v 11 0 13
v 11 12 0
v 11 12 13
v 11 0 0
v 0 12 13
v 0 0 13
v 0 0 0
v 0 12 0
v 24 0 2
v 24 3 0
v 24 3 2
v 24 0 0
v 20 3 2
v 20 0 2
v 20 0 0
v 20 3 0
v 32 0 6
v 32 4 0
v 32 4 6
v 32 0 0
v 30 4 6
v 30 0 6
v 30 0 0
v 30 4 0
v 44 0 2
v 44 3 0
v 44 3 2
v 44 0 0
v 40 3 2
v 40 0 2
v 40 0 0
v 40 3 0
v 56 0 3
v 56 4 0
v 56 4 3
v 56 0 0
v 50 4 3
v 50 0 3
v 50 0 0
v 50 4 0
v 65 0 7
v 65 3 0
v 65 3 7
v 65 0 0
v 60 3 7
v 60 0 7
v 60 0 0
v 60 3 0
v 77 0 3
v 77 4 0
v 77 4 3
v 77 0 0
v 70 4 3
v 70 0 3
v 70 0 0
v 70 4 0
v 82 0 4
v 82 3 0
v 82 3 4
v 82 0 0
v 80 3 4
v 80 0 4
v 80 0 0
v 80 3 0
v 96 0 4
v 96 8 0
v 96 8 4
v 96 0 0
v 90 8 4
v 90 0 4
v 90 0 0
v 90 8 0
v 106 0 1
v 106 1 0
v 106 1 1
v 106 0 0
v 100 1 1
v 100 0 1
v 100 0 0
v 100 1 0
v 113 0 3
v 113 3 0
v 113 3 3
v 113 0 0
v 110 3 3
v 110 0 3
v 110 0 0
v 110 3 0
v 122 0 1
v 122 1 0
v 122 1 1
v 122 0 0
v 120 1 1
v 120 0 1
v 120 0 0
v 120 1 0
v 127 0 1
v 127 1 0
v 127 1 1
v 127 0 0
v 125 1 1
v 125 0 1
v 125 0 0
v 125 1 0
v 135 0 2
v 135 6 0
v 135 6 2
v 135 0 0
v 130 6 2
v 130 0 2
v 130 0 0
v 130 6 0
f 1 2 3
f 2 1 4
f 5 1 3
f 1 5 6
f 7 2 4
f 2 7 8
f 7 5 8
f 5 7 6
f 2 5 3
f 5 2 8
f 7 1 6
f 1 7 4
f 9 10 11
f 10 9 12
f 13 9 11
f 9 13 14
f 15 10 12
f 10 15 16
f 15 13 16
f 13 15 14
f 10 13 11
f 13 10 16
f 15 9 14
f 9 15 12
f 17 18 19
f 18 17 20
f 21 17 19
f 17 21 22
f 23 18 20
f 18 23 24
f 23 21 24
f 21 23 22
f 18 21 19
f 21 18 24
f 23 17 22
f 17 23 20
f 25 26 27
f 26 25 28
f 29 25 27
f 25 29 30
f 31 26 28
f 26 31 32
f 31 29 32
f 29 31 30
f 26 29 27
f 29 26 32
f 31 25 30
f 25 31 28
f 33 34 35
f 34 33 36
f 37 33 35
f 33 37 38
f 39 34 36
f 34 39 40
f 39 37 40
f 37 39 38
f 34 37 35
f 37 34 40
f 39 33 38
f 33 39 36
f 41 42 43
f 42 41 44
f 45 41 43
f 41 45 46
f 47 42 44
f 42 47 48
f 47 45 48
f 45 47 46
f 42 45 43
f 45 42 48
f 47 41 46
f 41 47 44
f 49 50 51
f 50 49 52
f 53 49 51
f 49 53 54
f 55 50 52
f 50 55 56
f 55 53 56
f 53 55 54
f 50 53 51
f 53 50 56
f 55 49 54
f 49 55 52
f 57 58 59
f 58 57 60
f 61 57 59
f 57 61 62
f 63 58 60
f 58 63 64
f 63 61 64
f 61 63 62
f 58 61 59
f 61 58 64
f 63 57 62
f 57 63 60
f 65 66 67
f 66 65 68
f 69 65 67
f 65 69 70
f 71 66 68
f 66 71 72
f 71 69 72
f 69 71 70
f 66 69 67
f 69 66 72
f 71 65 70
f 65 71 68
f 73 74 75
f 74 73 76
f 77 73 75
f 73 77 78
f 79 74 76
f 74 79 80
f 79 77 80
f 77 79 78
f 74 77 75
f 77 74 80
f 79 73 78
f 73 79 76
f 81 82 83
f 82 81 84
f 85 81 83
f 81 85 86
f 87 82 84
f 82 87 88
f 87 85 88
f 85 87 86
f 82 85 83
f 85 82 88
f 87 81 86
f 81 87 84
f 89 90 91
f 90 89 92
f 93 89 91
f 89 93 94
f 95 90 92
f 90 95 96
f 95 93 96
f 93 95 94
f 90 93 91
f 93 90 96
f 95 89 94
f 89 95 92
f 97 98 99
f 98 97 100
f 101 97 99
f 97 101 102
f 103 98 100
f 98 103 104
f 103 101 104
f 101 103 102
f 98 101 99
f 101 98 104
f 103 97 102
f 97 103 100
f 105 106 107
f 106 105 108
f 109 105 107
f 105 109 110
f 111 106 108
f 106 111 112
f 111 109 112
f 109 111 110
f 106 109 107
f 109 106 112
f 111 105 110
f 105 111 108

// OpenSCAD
// vector arithmetic is OpenSCAD's, not Python's: every result below becomes a SIZE, so the volume sees it
p = [1, 2, 3];
cube(p + [10, 10, 10]);                                        // element-wise: 11 x 12 x 13, not a 6-list
translate([20, 0, 0]) cube(-p + [5, 5, 5]);                    // negation: 4 x 3 x 2
translate([30, 0, 0]) cube(p * 2);                             // scaling: 2 x 4 x 6
translate([40, 0, 0]) cube([8, 6, 4] / 2);                     // vector / number: 4 x 3 x 2
translate([50, 0, 0]) cube(12 / [2, 3, 4]);                    // number / vector: 6 x 4 x 3
m = [[0, -1, 0], [1, 0, 0], [0, 0, 1]];
translate([60, 0, 0]) cube(m * [3, 5, 7] + [10, 0, 0]);        // matrix x vector: [-5, 3, 7] + ... = 5 x 3 x 7
translate([70, 0, 0]) cube([1, 2, 3] * m + [5, 5, 0]);         // vector x matrix: [2, -1, 3] + ... = 7 x 4 x 3
mm = [[1, 2], [3, 4]] * [[0, 1], [1, 0]];                      // matrix x matrix: [[2, 1], [4, 3]]
translate([80, 0, 0]) cube([mm[0][0], mm[1][1], mm[1][0]]);    // 2 x 3 x 4
n = [[1, 2], [3, 4]] * 2;                                      // nested scaling: [[2, 4], [6, 8]]
translate([90, 0, 0]) cube([n[1][0], n[1][1], n[0][1]]);       // 6 x 8 x 4
d = [1, 2, 3] * [1, 1, 1];                                     // dot product: 6
translate([100, 0, 0]) cube([d, 1, 1]);
h = min(5 / 0, 3);                                             // 5 / 0 is inf, not an error
translate([110, 0, 0]) cube(h);
k = -7 % 3;                                                    // fmod: -1 (Python's % says 2)
translate([120, 0, 0]) cube([k + 3, 1, 1]);
k2 = 7 % -3;                                                   // fmod: 1 (Python's % says -2)
translate([125, 0, 0]) cube([k2 + 1, 1, 1]);
short = [1, 2, 3] + [4, 4];                                    // different lengths: truncated to [5, 6]
translate([130, 0, 0]) cube([short[0], short[1], len(short)]);
